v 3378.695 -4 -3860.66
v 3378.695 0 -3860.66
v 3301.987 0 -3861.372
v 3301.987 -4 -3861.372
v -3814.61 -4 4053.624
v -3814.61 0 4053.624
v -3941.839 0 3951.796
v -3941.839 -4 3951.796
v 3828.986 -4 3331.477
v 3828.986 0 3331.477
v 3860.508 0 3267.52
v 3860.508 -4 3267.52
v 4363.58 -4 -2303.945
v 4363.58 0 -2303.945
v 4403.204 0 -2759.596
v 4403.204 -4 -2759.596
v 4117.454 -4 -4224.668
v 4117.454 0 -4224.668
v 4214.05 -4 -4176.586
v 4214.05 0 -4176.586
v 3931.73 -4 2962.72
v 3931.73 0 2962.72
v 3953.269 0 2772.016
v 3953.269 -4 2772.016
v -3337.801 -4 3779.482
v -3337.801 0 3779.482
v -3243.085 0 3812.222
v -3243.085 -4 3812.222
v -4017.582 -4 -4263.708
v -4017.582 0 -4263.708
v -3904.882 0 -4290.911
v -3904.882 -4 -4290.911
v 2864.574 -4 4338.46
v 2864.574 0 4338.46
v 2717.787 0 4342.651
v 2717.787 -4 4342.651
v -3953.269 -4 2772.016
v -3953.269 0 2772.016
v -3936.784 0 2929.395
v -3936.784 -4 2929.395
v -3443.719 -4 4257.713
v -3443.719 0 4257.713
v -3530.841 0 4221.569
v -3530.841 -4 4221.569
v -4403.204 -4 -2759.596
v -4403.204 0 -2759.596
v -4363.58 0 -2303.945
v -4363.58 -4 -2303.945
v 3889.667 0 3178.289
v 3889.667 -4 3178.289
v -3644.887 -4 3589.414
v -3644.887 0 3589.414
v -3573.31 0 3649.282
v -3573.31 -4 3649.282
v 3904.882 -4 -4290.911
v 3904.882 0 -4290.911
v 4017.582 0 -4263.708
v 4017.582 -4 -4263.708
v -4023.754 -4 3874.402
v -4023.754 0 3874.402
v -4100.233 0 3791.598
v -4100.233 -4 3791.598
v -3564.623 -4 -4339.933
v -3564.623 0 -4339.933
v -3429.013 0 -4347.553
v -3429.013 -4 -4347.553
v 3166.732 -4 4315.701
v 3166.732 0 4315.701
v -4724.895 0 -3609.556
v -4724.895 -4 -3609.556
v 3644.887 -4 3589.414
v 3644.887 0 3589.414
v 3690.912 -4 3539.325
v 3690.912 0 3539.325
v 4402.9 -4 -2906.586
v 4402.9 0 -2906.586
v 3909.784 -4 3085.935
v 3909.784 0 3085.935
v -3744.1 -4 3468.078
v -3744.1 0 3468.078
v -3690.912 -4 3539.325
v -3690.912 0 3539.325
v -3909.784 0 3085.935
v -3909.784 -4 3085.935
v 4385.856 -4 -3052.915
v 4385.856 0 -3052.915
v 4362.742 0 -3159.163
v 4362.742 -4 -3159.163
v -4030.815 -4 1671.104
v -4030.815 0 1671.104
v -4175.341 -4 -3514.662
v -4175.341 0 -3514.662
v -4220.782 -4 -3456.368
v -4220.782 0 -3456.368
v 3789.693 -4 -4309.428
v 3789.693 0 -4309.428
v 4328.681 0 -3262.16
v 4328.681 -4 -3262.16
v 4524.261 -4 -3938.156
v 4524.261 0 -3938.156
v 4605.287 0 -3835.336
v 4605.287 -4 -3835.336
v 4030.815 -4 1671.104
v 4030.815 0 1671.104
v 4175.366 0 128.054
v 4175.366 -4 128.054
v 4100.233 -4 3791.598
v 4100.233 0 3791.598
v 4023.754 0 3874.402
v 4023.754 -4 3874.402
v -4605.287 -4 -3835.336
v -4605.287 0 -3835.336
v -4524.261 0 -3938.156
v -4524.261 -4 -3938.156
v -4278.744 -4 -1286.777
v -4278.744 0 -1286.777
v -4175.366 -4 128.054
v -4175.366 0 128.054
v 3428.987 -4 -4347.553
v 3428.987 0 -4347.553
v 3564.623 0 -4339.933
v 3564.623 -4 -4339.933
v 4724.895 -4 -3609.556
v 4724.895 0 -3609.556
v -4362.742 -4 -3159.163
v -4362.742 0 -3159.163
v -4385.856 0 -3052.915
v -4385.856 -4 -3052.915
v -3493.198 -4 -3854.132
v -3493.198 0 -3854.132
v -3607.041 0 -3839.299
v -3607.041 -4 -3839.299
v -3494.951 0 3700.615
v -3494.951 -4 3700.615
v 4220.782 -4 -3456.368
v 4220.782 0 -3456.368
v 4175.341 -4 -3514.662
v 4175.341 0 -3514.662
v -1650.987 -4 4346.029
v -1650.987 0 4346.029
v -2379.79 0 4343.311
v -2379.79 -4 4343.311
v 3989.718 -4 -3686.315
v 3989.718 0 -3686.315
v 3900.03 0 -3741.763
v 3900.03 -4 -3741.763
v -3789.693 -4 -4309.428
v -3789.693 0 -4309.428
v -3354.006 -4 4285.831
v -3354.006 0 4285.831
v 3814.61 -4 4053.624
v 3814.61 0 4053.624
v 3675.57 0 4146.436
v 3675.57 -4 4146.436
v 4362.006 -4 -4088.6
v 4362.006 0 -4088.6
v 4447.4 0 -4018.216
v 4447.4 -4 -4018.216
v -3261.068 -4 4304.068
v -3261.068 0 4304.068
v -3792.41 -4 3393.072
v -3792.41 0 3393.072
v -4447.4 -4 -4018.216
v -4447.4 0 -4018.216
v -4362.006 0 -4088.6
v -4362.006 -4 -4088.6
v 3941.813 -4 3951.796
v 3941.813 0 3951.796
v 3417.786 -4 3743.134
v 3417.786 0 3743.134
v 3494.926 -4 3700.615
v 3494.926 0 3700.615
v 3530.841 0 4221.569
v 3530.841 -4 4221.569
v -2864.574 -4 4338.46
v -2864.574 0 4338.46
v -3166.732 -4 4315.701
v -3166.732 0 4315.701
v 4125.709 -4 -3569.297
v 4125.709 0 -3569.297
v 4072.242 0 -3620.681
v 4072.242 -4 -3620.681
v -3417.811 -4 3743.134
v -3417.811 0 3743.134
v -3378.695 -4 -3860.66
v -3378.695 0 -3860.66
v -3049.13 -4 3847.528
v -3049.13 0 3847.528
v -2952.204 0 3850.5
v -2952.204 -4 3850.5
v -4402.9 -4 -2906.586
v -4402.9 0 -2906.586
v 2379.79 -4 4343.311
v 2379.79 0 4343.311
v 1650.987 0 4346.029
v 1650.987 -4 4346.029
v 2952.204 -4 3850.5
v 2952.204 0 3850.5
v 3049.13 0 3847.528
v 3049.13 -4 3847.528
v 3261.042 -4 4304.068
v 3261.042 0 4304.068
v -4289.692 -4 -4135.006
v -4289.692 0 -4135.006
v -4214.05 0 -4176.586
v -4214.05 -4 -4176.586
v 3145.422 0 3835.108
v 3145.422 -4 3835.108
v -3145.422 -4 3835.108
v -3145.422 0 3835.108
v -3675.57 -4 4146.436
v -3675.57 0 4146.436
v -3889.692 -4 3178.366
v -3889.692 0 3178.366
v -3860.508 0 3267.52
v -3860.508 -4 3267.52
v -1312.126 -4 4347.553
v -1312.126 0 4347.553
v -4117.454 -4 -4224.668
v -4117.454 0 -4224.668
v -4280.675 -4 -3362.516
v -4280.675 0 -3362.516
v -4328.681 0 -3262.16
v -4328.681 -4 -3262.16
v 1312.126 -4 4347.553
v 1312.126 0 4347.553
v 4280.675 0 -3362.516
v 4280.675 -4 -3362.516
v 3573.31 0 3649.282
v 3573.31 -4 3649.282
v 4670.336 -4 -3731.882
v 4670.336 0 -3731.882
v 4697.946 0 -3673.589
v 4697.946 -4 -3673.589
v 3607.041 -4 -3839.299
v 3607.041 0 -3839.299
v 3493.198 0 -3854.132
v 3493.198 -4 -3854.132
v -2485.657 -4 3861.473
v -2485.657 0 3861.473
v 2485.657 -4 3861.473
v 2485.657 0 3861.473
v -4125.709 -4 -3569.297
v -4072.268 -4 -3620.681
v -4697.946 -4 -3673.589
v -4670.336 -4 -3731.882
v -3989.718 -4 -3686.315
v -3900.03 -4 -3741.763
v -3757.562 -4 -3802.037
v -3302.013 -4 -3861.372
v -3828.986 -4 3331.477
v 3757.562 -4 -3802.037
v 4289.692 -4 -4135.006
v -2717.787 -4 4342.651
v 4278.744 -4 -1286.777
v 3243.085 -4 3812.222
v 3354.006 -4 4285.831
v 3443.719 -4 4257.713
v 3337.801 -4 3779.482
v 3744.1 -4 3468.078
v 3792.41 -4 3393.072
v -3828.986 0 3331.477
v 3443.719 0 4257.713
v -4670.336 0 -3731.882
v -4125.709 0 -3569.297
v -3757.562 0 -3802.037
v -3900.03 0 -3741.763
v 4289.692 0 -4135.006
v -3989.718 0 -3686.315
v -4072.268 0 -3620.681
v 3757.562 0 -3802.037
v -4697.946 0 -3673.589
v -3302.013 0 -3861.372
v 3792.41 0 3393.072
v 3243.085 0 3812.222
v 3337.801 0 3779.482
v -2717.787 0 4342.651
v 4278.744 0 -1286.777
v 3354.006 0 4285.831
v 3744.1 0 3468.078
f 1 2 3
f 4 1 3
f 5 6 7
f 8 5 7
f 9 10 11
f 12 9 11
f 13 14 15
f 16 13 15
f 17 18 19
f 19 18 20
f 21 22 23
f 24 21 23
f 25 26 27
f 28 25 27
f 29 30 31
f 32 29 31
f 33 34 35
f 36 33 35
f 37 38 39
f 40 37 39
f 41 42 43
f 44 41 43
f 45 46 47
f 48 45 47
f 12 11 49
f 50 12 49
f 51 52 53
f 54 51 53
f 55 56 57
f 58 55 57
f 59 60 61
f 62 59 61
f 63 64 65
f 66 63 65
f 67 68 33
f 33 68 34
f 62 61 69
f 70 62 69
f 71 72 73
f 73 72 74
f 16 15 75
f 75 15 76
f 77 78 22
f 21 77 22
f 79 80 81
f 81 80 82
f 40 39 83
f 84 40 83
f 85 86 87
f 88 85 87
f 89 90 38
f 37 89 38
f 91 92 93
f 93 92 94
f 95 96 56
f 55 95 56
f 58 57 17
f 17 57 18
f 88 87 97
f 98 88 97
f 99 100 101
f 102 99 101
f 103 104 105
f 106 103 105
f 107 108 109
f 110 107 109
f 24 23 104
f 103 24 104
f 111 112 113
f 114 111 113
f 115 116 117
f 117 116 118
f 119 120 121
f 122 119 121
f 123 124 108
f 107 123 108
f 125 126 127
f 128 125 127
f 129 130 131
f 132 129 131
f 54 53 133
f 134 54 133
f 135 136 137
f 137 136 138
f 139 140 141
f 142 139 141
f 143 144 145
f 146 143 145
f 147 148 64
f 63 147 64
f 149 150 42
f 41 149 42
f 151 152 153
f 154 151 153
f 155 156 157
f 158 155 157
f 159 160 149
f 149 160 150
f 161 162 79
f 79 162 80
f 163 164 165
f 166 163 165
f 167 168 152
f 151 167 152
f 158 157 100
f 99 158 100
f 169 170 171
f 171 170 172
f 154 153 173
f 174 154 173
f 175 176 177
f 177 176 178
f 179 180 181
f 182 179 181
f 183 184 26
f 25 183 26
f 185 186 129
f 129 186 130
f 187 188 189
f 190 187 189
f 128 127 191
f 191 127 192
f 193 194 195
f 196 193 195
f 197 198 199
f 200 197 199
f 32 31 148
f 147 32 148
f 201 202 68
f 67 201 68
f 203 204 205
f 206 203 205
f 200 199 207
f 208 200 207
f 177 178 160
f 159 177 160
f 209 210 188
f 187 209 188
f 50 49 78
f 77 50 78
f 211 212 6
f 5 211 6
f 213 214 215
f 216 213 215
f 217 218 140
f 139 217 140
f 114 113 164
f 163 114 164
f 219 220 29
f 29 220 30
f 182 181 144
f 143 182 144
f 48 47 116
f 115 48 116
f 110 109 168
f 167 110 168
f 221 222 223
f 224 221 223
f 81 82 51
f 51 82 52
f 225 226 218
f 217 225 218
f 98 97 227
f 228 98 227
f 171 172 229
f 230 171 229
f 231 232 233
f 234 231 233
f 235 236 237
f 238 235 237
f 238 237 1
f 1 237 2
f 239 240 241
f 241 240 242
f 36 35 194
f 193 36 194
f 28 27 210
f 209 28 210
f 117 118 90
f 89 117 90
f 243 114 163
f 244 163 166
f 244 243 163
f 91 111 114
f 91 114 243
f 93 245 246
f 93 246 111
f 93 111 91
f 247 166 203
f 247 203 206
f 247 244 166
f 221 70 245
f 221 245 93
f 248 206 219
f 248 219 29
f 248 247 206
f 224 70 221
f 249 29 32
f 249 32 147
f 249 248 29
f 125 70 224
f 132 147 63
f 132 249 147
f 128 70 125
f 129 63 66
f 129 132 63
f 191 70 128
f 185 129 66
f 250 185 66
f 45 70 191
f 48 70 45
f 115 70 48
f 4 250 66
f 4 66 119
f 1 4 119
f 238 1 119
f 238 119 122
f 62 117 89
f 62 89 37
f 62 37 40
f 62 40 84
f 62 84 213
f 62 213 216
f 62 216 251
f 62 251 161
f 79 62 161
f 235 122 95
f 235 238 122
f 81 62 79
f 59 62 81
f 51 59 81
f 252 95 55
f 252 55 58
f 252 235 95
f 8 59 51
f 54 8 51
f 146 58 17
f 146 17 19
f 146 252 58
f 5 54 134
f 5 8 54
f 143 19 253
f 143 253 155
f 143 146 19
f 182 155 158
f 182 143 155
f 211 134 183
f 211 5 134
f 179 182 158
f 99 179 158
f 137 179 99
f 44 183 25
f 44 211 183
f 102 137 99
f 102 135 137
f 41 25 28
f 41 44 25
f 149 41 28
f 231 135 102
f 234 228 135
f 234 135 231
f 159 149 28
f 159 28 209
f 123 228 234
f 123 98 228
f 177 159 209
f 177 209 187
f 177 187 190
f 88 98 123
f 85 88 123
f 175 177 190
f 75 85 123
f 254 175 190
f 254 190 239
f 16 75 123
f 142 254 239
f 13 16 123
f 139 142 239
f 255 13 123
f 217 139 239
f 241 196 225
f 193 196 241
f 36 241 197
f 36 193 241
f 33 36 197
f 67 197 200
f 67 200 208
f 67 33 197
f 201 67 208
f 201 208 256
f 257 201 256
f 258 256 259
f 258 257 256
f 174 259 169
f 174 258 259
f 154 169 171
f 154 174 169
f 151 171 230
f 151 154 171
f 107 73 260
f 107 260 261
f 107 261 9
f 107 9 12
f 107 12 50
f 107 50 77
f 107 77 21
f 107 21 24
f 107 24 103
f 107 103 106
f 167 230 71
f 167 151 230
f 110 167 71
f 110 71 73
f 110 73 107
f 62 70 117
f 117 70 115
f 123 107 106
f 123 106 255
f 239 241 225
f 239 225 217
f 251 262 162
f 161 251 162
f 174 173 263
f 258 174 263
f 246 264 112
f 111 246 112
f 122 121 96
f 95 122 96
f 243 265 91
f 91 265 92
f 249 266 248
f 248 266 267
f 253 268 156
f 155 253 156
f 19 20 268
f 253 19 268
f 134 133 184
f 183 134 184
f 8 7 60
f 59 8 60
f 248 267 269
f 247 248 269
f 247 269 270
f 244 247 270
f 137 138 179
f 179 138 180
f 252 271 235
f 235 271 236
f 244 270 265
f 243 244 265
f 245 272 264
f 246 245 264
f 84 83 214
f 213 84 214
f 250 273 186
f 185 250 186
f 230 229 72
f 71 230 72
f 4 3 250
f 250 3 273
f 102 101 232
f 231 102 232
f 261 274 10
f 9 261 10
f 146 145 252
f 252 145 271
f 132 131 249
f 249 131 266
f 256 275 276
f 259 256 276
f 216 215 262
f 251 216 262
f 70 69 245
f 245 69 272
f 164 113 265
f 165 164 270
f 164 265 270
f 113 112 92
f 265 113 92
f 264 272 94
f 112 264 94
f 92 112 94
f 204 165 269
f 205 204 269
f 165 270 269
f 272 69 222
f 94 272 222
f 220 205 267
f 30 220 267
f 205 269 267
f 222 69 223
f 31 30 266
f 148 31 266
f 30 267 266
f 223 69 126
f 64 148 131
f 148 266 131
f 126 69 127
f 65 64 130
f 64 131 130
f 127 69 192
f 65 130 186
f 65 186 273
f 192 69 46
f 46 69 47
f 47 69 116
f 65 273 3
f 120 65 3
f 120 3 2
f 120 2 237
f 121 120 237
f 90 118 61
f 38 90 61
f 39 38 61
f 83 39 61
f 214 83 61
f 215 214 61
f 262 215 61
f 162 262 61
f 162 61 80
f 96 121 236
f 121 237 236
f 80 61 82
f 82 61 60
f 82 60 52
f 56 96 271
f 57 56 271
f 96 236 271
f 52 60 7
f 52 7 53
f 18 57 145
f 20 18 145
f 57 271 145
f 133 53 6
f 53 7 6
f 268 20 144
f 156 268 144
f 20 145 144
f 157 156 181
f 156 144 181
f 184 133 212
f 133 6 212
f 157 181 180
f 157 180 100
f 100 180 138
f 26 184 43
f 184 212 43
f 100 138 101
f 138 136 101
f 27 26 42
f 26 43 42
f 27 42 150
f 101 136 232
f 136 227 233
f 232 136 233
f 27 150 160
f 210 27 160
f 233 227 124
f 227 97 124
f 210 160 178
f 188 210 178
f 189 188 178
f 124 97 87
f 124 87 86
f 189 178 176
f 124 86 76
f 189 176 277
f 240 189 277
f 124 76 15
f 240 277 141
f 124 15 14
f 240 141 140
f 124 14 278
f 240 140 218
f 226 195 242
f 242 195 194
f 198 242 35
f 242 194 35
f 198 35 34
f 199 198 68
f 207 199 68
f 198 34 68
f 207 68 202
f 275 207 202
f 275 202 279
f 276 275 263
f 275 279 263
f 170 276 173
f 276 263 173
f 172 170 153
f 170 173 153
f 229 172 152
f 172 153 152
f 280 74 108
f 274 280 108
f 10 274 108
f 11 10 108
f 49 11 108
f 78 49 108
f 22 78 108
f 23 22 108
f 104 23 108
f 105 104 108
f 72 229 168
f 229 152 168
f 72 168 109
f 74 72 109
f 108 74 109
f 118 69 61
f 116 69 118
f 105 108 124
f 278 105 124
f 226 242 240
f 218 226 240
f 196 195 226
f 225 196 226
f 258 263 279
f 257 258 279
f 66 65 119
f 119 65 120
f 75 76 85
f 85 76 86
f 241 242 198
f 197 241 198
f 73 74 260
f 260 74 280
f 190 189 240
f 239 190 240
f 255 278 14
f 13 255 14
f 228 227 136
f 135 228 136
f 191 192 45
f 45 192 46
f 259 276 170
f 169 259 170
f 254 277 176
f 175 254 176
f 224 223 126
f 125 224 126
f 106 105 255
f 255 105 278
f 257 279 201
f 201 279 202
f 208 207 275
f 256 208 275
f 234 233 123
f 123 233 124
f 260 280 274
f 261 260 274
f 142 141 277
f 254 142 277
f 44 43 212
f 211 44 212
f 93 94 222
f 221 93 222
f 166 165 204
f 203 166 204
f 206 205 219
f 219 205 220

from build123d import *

# Parameters (mm, degrees)
F1_DEPTH = 4


with BuildPart() as f1:
    # F0 (on Front) → F1 (new body)
    with BuildSketch(Plane.XZ):
        Polygon((-4023.7537, 3874.4017), (-4100.2331, 3791.5977), (-4724.8953, -3609.5559), (-4697.9459, -3673.5893), (-4670.3361, -3731.8823), (-4605.2867, -3835.3365), (-4524.2607, -3938.1557), (-4447.4003, -4018.2165), (-4362.0055, -4088.5999), (-4289.6917, -4135.0057), (-4214.0505, -4176.5855), (-4117.4543, -4224.6677), (-4017.5815, -4263.7075), (-3904.8817, -4290.9109), (-3789.6927, -4309.4275), (-3564.6233, -4339.9329), (-3429.0127, -4347.5529), (-3169.8565, -4347.5529), (-2286.0127, -4347.5529), (-2195.9189, -4347.5529), (-1143.0127, -4347.5529), (-1138.3137, -4347.5529), (-0.0127, -4347.5529), (1138.3137, -4347.5529), (1142.9873, -4347.5529), (2195.9189, -4347.5529), (2285.9873, -4347.5529), (3169.8565, -4347.5529), (3428.9873, -4347.5529), (3564.6233, -4339.9329), (3789.6927, -4309.4275), (3904.8817, -4290.9109), (4017.5815, -4263.7075), (4117.4543, -4224.6677), (4214.0505, -4176.5855), (4289.6917, -4135.0057), (4362.0055, -4088.5999), (4447.4003, -4018.2165), (4524.2607, -3938.1557), (4605.2867, -3835.3365), (4670.3361, -3731.8823), (4697.9459, -3673.5893), (4724.8953, -3609.5559), (4100.2331, 3791.5977), (4023.7537, 3874.4017), (3941.8133, 3951.7955), (3814.6101, 4053.6241), (3675.5705, 4146.4357), (3530.8413, 4221.5689), (3443.7193, 4257.7131), (3354.0065, 4285.8309), (3261.0425, 4304.0681), (3166.7323, 4315.7013), (2864.5739, 4338.4597), (2717.7873, 4342.6507), (2379.7895, 4343.3111), (1650.9873, 4346.0289), (1312.1259, 4347.5529), (176.9999, 4347.5529), (-0.0127, 4347.5529), (-177.0253, 4347.5529), (-1312.1259, 4347.5529), (-1650.9873, 4346.0289), (-2379.7895, 4343.3111), (-2717.7873, 4342.6507), (-2864.5739, 4338.4597), (-3166.7323, 4315.7013), (-3261.0679, 4304.0681), (-3354.0065, 4285.8309), (-3443.7193, 4257.7131), (-3530.8413, 4221.5689), (-3675.5705, 4146.4357), (-3814.6101, 4053.6241), (-3941.8387, 3951.7955), align=None)
        Polygon((-0.0127, 3861.4731), (1492.5675, 3861.4731), (2485.6567, 3861.4731), (2952.2039, 3850.5003), (3049.1303, 3847.5285), (3145.4217, 3835.1079), (3243.0847, 3812.2225), (3337.8013, 3779.4819), (3417.7859, 3743.1345), (3494.9257, 3700.6149), (3573.3101, 3649.2815), (3644.8873, 3589.4137), (3690.9121, 3539.3249), (3744.0997, 3468.0779), (3792.4105, 3393.0717), (3828.9865, 3331.4767), (3860.5079, 3267.5195), (3889.6671, 3178.2893), (3909.7839, 3085.9349), (3931.7295, 2962.7195), (3953.2687, 2772.0163), (4030.8149, 1671.1041), (4175.3663, 128.0541), (4278.7443, -1286.7767), (4363.5803, -2303.9451), (4403.2043, -2759.5957), (4402.8995, -2906.5855), (4385.8561, -3052.9149), (4362.7421, -3159.1631), (4328.6807, -3262.1601), (4280.6747, -3362.5155), (4220.7815, -3456.3685), (4175.3409, -3514.6615), (4125.7093, -3569.2969), (4072.2423, -3620.6811), (3989.7177, -3686.3147), (3900.0303, -3741.7629), (3757.5617, -3802.0371), (3607.0413, -3839.2989), (3493.1985, -3854.1325), (3378.6953, -3860.6603), (3301.9873, -3861.3715), (2285.9873, -3861.3715), (761.9873, -3861.3715), (-0.0127, -3861.3715), (-762.0127, -3861.3715), (-2286.0127, -3861.3715), (-3302.0127, -3861.3715), (-3378.6953, -3860.6603), (-3493.1985, -3854.1325), (-3607.0413, -3839.2989), (-3757.5617, -3802.0371), (-3900.0303, -3741.7629), (-3989.7177, -3686.3147), (-4072.2677, -3620.6811), (-4125.7093, -3569.2969), (-4175.3409, -3514.6615), (-4220.7815, -3456.3685), (-4280.6747, -3362.5155), (-4328.6807, -3262.1601), (-4362.7421, -3159.1631), (-4385.8561, -3052.9149), (-4402.8995, -2906.5855), (-4403.2043, -2759.5957), (-4363.5803, -2303.9451), (-4278.7443, -1286.7767), (-4175.3663, 128.0541), (-4030.8149, 1671.1041), (-3953.2687, 2772.0163), (-3936.7841, 2929.3947), (-3909.7839, 3085.9349), (-3889.6925, 3178.3655), (-3860.5079, 3267.5195), (-3828.9865, 3331.4767), (-3792.4105, 3393.0717), (-3744.0997, 3468.0779), (-3690.9121, 3539.3249), (-3644.8873, 3589.4137), (-3573.3101, 3649.2815), (-3494.9511, 3700.6149), (-3417.8113, 3743.1345), (-3337.8013, 3779.4819), (-3243.0847, 3812.2225), (-3145.4217, 3835.1079), (-3049.1303, 3847.5285), (-2952.2039, 3850.5003), (-2485.6567, 3861.4731), (-1492.5929, 3861.4731), align=None, mode=Mode.SUBTRACT)
    extrude(amount=F1_DEPTH)


solid = f1.part
